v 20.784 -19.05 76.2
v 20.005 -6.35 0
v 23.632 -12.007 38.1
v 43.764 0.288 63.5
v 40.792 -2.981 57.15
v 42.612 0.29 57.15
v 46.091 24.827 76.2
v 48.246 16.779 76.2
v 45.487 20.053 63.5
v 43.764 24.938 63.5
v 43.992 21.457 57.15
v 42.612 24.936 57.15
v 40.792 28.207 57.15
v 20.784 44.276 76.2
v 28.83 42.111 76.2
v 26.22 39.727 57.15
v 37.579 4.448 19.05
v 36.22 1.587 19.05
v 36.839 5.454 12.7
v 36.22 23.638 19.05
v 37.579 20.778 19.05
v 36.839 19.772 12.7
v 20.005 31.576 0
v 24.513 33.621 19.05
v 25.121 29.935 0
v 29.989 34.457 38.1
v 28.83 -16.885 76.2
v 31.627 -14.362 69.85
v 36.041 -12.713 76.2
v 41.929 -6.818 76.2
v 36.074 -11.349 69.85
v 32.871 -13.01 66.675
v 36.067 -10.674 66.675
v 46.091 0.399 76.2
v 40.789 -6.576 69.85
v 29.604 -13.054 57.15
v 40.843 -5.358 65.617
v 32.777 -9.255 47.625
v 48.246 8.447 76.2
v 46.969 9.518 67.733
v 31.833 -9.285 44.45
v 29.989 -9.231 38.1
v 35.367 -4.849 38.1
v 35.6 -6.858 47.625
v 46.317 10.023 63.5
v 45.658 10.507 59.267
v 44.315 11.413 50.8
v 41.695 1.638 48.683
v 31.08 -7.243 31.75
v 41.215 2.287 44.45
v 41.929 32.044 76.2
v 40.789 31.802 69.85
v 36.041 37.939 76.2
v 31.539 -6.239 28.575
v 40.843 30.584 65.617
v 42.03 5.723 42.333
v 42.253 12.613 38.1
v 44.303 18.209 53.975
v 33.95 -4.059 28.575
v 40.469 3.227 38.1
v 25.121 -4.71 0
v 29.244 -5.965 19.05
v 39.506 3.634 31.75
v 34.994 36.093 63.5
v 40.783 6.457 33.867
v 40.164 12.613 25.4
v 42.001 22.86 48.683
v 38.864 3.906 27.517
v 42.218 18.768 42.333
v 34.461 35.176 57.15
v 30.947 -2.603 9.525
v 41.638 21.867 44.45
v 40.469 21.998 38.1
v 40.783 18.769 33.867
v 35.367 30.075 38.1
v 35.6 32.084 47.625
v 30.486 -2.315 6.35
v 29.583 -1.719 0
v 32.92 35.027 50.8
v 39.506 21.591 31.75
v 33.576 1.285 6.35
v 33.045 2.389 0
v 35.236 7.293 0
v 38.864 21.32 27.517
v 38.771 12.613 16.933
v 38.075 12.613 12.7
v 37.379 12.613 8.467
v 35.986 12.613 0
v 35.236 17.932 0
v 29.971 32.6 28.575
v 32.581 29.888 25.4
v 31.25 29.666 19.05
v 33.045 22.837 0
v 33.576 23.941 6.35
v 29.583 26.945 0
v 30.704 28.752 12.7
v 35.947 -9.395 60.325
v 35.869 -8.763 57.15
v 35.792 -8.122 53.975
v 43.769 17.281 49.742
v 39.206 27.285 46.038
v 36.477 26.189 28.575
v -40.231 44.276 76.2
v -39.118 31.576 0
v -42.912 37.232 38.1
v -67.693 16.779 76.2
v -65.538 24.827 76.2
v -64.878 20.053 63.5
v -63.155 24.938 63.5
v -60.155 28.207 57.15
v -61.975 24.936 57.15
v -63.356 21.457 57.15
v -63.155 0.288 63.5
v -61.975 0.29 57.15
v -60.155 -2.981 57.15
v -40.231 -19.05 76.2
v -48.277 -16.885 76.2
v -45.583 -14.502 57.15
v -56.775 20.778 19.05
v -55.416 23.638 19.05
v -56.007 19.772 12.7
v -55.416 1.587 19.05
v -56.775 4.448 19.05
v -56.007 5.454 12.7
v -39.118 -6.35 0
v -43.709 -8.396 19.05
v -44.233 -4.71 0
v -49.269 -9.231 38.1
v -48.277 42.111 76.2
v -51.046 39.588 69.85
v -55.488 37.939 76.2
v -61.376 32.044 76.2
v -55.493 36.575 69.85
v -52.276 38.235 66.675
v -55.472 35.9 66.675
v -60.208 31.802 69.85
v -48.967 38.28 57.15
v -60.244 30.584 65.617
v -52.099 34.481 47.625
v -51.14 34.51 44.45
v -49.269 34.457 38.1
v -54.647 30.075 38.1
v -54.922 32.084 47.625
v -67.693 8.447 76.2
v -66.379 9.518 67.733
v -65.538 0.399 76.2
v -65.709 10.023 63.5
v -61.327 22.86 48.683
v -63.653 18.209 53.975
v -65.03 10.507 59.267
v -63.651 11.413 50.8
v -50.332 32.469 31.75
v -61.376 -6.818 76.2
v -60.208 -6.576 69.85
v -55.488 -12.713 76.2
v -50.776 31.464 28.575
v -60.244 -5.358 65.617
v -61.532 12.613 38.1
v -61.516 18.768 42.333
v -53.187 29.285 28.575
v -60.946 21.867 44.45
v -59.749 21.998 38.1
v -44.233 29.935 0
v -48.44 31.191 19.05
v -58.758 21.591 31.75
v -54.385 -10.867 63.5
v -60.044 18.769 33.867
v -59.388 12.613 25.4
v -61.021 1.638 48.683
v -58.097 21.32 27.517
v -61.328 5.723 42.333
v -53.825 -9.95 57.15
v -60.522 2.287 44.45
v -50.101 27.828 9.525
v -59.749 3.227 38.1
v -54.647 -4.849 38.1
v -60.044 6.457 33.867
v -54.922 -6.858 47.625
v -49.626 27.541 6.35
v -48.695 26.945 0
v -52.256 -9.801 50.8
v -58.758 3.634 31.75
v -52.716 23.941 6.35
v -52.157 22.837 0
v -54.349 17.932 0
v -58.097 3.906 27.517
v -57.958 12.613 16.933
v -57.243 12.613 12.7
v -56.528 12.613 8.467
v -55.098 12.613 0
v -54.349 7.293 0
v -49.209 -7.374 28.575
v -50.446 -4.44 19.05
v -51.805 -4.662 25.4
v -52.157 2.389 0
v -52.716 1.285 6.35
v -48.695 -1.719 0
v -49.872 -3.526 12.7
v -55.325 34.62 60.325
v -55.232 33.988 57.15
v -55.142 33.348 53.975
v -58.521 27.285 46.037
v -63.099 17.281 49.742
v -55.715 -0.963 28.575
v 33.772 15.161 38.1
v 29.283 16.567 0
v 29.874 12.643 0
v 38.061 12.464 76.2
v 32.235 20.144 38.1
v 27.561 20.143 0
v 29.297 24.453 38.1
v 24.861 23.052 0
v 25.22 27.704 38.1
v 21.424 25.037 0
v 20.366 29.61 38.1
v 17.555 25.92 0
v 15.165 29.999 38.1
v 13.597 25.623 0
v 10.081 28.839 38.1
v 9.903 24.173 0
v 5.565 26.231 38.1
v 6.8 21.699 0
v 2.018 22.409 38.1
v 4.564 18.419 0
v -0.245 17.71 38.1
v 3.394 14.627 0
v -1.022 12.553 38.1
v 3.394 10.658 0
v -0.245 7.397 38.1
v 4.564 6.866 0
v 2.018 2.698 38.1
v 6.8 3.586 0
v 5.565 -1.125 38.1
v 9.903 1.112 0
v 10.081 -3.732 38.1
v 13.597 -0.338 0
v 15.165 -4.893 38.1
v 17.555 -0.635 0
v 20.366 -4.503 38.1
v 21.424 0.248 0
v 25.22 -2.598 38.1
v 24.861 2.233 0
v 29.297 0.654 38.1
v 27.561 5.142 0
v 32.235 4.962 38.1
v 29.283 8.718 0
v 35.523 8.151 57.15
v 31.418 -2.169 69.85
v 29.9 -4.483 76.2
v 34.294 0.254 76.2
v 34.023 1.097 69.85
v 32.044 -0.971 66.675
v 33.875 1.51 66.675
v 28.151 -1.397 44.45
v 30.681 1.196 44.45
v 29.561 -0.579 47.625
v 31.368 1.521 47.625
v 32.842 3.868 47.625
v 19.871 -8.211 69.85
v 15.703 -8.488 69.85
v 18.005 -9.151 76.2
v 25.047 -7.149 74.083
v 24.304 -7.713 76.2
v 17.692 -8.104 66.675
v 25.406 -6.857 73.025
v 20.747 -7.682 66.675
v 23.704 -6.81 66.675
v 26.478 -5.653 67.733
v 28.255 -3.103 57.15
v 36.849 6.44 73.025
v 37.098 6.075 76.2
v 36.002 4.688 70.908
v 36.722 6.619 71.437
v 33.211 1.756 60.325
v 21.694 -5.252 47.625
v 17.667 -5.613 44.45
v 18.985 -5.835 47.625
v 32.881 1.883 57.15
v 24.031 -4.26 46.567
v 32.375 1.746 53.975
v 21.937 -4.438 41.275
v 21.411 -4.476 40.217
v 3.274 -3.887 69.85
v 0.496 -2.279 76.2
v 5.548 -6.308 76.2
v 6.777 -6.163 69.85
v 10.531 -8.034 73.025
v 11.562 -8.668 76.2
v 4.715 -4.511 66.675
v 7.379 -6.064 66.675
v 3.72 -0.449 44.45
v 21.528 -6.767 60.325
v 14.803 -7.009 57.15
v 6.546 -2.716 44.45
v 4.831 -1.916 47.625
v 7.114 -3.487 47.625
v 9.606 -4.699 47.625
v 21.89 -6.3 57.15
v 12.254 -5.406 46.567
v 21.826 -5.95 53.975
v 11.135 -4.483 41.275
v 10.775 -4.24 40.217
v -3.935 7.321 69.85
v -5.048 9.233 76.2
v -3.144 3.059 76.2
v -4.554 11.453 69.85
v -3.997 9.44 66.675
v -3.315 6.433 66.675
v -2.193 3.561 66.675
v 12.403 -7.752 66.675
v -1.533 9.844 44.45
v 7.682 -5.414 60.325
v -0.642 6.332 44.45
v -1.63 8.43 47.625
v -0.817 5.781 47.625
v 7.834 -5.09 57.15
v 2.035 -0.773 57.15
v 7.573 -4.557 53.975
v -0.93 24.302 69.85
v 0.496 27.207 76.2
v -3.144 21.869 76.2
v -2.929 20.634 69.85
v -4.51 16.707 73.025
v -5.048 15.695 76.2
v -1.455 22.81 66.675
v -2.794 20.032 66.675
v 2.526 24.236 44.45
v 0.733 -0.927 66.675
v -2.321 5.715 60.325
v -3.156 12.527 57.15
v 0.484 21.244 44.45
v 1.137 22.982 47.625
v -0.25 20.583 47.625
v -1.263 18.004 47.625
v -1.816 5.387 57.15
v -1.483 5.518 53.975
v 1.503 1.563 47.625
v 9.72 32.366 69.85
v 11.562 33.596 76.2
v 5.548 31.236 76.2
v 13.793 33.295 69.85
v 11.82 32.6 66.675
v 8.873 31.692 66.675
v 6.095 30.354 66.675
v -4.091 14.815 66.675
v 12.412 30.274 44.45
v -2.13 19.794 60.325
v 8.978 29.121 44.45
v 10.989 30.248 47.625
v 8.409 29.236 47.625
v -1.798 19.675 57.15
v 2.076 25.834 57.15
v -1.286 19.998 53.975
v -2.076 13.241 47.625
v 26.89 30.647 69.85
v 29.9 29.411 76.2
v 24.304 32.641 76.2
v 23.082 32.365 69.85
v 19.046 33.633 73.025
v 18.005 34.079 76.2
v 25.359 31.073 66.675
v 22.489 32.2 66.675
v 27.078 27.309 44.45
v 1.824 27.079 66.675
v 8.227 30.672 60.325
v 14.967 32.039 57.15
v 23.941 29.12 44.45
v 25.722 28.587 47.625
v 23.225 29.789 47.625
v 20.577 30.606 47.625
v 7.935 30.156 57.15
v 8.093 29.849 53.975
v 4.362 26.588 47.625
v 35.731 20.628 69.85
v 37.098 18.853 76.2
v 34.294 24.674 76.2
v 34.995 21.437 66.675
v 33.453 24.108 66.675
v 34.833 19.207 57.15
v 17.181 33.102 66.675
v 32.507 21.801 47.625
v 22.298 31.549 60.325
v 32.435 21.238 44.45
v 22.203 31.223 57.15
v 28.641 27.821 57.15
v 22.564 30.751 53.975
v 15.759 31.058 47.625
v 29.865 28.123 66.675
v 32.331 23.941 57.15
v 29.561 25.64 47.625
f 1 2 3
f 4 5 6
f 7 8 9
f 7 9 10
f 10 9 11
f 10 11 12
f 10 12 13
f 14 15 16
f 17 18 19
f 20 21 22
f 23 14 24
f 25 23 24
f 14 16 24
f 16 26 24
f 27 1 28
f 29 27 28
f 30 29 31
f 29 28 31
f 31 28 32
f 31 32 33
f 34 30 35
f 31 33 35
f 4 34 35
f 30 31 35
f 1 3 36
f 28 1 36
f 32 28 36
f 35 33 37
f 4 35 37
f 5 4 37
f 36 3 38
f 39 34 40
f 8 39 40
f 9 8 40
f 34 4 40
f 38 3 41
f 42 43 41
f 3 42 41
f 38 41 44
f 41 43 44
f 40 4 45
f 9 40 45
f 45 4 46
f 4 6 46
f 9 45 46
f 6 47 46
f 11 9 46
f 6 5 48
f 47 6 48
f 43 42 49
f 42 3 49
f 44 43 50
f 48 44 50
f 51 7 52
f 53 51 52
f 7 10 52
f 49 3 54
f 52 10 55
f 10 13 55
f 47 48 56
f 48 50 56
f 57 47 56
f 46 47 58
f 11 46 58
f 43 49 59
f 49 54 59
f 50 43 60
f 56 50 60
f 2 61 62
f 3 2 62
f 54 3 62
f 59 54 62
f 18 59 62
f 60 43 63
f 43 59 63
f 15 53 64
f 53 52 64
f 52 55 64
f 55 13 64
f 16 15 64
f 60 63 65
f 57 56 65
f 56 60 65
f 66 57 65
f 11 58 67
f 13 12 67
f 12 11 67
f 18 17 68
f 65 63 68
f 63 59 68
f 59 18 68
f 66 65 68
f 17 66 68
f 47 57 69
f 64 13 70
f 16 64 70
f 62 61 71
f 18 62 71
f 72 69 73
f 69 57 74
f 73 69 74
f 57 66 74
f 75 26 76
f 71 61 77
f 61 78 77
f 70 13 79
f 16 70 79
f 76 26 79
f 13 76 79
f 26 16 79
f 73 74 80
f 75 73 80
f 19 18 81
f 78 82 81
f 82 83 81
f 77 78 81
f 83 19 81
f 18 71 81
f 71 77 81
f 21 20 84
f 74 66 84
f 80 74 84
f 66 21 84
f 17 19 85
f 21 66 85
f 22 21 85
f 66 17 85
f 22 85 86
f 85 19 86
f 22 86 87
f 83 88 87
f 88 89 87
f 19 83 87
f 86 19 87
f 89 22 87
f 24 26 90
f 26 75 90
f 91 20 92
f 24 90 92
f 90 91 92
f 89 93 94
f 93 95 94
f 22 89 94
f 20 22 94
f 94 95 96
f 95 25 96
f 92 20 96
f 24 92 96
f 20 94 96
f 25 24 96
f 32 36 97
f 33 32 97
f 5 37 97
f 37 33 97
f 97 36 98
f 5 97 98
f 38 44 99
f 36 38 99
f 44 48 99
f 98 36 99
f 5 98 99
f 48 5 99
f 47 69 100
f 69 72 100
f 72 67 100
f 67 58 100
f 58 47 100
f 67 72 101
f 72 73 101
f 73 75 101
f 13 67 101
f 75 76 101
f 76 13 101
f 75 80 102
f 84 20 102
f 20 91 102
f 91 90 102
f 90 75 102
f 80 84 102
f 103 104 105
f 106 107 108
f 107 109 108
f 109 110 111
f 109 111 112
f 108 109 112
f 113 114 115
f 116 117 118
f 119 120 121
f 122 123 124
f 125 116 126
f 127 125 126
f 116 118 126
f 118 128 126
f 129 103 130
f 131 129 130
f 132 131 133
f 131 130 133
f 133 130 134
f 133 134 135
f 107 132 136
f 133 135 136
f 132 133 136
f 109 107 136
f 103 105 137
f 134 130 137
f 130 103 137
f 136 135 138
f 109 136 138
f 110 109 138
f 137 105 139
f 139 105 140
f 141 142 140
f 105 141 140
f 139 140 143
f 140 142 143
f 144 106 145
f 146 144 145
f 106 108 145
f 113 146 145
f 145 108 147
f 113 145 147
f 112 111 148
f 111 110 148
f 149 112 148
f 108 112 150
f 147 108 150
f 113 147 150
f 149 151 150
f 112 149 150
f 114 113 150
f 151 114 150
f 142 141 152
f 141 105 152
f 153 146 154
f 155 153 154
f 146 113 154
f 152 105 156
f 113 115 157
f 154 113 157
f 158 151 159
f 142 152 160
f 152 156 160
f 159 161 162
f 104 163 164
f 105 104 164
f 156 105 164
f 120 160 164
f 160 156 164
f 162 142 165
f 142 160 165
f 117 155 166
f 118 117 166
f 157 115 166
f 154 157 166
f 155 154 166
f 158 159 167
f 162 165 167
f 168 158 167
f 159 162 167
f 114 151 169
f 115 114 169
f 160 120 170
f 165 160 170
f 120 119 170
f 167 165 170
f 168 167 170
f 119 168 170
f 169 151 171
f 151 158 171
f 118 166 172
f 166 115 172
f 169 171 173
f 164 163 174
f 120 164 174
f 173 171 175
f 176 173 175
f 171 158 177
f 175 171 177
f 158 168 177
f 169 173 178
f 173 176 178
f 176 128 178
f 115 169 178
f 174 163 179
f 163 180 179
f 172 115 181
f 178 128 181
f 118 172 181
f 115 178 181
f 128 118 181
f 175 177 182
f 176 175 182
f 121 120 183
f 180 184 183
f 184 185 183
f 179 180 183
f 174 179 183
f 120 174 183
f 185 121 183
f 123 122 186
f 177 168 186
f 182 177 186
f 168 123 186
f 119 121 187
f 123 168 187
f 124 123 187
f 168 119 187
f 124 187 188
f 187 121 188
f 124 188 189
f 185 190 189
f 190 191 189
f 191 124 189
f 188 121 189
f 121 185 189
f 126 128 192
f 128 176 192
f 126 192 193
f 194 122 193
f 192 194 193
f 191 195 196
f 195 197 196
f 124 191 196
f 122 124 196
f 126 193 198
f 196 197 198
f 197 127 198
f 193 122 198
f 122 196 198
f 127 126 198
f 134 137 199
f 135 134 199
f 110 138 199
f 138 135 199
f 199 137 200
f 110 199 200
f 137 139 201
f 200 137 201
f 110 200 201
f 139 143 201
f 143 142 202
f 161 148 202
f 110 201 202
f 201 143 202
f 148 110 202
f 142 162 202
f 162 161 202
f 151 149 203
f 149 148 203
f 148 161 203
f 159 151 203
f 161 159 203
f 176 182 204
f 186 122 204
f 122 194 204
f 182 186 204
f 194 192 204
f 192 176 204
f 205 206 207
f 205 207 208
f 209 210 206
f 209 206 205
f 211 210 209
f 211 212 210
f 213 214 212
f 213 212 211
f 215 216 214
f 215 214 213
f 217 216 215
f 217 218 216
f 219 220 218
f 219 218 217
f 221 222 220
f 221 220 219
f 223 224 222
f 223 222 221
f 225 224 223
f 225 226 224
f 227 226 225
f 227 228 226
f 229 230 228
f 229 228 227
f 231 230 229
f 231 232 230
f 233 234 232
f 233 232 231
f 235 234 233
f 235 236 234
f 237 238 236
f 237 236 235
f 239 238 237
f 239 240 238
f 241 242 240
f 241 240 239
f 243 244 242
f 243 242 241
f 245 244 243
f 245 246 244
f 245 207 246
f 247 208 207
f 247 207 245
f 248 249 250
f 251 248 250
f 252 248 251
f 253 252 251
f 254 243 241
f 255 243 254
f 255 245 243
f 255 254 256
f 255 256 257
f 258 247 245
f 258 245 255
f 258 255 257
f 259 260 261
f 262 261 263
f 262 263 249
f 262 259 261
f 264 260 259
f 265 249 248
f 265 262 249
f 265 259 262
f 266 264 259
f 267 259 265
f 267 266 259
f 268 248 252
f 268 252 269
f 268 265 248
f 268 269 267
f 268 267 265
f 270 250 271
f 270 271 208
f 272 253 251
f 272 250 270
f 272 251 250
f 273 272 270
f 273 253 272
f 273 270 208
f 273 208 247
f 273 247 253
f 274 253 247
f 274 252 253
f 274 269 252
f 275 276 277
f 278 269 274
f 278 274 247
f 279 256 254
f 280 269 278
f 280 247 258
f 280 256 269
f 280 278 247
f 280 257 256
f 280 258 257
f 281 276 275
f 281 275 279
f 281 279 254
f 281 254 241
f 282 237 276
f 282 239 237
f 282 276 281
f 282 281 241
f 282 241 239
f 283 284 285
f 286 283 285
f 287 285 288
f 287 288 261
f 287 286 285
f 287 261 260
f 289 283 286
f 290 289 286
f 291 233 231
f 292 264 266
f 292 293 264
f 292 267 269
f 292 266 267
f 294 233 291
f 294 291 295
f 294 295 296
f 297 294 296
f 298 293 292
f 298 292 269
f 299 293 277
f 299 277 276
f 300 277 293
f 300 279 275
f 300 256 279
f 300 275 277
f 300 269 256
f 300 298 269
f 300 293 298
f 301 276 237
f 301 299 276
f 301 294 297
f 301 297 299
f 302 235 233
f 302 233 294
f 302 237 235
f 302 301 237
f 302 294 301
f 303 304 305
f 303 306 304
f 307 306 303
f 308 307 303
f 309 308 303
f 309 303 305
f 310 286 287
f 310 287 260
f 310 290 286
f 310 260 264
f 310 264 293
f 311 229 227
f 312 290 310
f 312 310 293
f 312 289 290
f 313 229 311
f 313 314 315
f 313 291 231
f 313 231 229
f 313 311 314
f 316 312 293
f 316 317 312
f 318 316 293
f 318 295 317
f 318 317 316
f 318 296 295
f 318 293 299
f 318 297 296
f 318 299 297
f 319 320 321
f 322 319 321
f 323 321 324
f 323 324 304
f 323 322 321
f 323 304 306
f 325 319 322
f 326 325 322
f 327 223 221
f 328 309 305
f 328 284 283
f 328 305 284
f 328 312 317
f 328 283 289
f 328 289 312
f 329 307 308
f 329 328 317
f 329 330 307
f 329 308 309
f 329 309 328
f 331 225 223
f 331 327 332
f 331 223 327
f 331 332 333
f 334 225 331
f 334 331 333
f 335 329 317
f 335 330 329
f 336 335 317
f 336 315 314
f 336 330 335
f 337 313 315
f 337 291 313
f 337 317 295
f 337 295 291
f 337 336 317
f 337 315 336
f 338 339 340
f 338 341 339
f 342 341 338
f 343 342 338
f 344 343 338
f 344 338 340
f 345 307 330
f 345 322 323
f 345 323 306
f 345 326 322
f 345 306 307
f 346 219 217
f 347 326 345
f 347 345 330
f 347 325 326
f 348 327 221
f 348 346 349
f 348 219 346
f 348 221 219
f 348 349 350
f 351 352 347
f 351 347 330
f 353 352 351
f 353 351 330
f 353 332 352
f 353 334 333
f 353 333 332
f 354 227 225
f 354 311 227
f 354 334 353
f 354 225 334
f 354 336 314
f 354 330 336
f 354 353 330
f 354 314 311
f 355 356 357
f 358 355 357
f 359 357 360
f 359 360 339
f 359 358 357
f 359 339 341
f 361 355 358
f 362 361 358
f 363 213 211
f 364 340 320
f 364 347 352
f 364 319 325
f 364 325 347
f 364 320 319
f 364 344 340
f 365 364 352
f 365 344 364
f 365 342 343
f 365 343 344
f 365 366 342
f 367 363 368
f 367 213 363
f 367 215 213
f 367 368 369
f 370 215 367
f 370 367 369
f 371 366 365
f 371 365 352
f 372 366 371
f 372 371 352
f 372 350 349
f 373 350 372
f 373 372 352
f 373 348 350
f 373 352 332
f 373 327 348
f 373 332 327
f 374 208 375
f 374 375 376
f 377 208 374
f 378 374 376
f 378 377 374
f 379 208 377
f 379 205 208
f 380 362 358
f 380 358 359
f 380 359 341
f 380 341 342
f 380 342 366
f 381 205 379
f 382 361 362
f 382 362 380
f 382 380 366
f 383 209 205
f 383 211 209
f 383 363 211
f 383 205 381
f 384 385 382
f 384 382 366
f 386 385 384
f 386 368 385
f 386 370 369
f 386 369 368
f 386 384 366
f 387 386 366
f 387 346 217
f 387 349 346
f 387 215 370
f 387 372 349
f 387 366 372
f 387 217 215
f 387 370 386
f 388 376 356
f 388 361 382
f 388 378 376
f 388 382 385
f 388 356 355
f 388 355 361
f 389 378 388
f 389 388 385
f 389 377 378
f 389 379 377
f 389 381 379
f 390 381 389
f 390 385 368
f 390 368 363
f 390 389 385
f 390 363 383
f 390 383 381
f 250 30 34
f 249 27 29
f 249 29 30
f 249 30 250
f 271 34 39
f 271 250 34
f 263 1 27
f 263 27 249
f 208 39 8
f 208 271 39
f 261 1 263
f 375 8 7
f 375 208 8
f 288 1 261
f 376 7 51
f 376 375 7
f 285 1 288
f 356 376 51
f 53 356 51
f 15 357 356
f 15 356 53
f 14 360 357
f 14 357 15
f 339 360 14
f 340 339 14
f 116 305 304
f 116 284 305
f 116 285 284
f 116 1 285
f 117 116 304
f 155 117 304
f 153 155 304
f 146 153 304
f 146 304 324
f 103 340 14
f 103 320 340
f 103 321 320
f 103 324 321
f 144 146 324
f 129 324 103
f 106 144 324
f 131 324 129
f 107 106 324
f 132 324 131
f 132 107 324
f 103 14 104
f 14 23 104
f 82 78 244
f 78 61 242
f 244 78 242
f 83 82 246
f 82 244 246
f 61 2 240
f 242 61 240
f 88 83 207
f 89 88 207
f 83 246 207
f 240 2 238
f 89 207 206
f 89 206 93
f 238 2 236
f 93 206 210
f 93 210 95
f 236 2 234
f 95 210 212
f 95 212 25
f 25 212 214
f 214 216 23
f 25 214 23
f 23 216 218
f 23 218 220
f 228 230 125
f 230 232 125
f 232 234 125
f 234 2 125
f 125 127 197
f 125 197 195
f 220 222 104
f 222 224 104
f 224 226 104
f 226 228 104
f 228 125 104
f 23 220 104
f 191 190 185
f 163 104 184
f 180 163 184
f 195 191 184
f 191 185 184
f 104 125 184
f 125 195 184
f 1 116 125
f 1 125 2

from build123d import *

# Parameters (mm, degrees)
F4_R = 21.6754644631
F5_R = 13.3144971064


with BuildPart() as f3:
    # F2 (on face) → F3 section 0
    with BuildSketch(Plane.XY.offset(76.2)):
        with BuildLine():
            Line((20.7843769666, 44.2757006465), (-40.2313820243, 44.2757006465))
            ThreePointArc((-40.2313820243, 44.2757006465), (-67.9658874869, 12.6128514133), (-40.2313820243, -19.0499978198))
            Line((-40.2313820243, -19.0499978198), (20.7843769666, -19.0499978198))
            ThreePointArc((20.7843769666, -19.0499978198), (48.5188824293, 12.6128514133), (20.7843769666, 44.2757006465))
        make_face()
    # F0 (on Top) → F3 section 1
    with BuildSketch(Plane.XY):
        with BuildLine():
            ThreePointArc((-39.1175734429, 31.5757045358), (-55.0984784521, 12.6128522679), (-39.1175734429, -6.35))
            Line((-39.1175734429, -6.35), (20.0053925244, -6.35))
            ThreePointArc((20.0053925244, -6.35), (35.9862975337, 12.6128522679), (20.0053925244, 31.5757045358))
            Line((20.0053925244, 31.5757045358), (-39.1175734429, 31.5757045358))
        make_face()
    loft()

    # F4 (on face) → F6 section 0
    with BuildSketch(Plane.XY.offset(76.2)):
        with Locations((16.3852963597, 12.4639989808)):
            Circle(F4_R)
    # F5 (on Top) → F6 section 1
    with BuildSketch(Plane.XY):
        with Locations((16.5599323809, 12.6425297931)):
            Circle(F5_R)
    loft(mode=Mode.SUBTRACT)


solid = f3.part
